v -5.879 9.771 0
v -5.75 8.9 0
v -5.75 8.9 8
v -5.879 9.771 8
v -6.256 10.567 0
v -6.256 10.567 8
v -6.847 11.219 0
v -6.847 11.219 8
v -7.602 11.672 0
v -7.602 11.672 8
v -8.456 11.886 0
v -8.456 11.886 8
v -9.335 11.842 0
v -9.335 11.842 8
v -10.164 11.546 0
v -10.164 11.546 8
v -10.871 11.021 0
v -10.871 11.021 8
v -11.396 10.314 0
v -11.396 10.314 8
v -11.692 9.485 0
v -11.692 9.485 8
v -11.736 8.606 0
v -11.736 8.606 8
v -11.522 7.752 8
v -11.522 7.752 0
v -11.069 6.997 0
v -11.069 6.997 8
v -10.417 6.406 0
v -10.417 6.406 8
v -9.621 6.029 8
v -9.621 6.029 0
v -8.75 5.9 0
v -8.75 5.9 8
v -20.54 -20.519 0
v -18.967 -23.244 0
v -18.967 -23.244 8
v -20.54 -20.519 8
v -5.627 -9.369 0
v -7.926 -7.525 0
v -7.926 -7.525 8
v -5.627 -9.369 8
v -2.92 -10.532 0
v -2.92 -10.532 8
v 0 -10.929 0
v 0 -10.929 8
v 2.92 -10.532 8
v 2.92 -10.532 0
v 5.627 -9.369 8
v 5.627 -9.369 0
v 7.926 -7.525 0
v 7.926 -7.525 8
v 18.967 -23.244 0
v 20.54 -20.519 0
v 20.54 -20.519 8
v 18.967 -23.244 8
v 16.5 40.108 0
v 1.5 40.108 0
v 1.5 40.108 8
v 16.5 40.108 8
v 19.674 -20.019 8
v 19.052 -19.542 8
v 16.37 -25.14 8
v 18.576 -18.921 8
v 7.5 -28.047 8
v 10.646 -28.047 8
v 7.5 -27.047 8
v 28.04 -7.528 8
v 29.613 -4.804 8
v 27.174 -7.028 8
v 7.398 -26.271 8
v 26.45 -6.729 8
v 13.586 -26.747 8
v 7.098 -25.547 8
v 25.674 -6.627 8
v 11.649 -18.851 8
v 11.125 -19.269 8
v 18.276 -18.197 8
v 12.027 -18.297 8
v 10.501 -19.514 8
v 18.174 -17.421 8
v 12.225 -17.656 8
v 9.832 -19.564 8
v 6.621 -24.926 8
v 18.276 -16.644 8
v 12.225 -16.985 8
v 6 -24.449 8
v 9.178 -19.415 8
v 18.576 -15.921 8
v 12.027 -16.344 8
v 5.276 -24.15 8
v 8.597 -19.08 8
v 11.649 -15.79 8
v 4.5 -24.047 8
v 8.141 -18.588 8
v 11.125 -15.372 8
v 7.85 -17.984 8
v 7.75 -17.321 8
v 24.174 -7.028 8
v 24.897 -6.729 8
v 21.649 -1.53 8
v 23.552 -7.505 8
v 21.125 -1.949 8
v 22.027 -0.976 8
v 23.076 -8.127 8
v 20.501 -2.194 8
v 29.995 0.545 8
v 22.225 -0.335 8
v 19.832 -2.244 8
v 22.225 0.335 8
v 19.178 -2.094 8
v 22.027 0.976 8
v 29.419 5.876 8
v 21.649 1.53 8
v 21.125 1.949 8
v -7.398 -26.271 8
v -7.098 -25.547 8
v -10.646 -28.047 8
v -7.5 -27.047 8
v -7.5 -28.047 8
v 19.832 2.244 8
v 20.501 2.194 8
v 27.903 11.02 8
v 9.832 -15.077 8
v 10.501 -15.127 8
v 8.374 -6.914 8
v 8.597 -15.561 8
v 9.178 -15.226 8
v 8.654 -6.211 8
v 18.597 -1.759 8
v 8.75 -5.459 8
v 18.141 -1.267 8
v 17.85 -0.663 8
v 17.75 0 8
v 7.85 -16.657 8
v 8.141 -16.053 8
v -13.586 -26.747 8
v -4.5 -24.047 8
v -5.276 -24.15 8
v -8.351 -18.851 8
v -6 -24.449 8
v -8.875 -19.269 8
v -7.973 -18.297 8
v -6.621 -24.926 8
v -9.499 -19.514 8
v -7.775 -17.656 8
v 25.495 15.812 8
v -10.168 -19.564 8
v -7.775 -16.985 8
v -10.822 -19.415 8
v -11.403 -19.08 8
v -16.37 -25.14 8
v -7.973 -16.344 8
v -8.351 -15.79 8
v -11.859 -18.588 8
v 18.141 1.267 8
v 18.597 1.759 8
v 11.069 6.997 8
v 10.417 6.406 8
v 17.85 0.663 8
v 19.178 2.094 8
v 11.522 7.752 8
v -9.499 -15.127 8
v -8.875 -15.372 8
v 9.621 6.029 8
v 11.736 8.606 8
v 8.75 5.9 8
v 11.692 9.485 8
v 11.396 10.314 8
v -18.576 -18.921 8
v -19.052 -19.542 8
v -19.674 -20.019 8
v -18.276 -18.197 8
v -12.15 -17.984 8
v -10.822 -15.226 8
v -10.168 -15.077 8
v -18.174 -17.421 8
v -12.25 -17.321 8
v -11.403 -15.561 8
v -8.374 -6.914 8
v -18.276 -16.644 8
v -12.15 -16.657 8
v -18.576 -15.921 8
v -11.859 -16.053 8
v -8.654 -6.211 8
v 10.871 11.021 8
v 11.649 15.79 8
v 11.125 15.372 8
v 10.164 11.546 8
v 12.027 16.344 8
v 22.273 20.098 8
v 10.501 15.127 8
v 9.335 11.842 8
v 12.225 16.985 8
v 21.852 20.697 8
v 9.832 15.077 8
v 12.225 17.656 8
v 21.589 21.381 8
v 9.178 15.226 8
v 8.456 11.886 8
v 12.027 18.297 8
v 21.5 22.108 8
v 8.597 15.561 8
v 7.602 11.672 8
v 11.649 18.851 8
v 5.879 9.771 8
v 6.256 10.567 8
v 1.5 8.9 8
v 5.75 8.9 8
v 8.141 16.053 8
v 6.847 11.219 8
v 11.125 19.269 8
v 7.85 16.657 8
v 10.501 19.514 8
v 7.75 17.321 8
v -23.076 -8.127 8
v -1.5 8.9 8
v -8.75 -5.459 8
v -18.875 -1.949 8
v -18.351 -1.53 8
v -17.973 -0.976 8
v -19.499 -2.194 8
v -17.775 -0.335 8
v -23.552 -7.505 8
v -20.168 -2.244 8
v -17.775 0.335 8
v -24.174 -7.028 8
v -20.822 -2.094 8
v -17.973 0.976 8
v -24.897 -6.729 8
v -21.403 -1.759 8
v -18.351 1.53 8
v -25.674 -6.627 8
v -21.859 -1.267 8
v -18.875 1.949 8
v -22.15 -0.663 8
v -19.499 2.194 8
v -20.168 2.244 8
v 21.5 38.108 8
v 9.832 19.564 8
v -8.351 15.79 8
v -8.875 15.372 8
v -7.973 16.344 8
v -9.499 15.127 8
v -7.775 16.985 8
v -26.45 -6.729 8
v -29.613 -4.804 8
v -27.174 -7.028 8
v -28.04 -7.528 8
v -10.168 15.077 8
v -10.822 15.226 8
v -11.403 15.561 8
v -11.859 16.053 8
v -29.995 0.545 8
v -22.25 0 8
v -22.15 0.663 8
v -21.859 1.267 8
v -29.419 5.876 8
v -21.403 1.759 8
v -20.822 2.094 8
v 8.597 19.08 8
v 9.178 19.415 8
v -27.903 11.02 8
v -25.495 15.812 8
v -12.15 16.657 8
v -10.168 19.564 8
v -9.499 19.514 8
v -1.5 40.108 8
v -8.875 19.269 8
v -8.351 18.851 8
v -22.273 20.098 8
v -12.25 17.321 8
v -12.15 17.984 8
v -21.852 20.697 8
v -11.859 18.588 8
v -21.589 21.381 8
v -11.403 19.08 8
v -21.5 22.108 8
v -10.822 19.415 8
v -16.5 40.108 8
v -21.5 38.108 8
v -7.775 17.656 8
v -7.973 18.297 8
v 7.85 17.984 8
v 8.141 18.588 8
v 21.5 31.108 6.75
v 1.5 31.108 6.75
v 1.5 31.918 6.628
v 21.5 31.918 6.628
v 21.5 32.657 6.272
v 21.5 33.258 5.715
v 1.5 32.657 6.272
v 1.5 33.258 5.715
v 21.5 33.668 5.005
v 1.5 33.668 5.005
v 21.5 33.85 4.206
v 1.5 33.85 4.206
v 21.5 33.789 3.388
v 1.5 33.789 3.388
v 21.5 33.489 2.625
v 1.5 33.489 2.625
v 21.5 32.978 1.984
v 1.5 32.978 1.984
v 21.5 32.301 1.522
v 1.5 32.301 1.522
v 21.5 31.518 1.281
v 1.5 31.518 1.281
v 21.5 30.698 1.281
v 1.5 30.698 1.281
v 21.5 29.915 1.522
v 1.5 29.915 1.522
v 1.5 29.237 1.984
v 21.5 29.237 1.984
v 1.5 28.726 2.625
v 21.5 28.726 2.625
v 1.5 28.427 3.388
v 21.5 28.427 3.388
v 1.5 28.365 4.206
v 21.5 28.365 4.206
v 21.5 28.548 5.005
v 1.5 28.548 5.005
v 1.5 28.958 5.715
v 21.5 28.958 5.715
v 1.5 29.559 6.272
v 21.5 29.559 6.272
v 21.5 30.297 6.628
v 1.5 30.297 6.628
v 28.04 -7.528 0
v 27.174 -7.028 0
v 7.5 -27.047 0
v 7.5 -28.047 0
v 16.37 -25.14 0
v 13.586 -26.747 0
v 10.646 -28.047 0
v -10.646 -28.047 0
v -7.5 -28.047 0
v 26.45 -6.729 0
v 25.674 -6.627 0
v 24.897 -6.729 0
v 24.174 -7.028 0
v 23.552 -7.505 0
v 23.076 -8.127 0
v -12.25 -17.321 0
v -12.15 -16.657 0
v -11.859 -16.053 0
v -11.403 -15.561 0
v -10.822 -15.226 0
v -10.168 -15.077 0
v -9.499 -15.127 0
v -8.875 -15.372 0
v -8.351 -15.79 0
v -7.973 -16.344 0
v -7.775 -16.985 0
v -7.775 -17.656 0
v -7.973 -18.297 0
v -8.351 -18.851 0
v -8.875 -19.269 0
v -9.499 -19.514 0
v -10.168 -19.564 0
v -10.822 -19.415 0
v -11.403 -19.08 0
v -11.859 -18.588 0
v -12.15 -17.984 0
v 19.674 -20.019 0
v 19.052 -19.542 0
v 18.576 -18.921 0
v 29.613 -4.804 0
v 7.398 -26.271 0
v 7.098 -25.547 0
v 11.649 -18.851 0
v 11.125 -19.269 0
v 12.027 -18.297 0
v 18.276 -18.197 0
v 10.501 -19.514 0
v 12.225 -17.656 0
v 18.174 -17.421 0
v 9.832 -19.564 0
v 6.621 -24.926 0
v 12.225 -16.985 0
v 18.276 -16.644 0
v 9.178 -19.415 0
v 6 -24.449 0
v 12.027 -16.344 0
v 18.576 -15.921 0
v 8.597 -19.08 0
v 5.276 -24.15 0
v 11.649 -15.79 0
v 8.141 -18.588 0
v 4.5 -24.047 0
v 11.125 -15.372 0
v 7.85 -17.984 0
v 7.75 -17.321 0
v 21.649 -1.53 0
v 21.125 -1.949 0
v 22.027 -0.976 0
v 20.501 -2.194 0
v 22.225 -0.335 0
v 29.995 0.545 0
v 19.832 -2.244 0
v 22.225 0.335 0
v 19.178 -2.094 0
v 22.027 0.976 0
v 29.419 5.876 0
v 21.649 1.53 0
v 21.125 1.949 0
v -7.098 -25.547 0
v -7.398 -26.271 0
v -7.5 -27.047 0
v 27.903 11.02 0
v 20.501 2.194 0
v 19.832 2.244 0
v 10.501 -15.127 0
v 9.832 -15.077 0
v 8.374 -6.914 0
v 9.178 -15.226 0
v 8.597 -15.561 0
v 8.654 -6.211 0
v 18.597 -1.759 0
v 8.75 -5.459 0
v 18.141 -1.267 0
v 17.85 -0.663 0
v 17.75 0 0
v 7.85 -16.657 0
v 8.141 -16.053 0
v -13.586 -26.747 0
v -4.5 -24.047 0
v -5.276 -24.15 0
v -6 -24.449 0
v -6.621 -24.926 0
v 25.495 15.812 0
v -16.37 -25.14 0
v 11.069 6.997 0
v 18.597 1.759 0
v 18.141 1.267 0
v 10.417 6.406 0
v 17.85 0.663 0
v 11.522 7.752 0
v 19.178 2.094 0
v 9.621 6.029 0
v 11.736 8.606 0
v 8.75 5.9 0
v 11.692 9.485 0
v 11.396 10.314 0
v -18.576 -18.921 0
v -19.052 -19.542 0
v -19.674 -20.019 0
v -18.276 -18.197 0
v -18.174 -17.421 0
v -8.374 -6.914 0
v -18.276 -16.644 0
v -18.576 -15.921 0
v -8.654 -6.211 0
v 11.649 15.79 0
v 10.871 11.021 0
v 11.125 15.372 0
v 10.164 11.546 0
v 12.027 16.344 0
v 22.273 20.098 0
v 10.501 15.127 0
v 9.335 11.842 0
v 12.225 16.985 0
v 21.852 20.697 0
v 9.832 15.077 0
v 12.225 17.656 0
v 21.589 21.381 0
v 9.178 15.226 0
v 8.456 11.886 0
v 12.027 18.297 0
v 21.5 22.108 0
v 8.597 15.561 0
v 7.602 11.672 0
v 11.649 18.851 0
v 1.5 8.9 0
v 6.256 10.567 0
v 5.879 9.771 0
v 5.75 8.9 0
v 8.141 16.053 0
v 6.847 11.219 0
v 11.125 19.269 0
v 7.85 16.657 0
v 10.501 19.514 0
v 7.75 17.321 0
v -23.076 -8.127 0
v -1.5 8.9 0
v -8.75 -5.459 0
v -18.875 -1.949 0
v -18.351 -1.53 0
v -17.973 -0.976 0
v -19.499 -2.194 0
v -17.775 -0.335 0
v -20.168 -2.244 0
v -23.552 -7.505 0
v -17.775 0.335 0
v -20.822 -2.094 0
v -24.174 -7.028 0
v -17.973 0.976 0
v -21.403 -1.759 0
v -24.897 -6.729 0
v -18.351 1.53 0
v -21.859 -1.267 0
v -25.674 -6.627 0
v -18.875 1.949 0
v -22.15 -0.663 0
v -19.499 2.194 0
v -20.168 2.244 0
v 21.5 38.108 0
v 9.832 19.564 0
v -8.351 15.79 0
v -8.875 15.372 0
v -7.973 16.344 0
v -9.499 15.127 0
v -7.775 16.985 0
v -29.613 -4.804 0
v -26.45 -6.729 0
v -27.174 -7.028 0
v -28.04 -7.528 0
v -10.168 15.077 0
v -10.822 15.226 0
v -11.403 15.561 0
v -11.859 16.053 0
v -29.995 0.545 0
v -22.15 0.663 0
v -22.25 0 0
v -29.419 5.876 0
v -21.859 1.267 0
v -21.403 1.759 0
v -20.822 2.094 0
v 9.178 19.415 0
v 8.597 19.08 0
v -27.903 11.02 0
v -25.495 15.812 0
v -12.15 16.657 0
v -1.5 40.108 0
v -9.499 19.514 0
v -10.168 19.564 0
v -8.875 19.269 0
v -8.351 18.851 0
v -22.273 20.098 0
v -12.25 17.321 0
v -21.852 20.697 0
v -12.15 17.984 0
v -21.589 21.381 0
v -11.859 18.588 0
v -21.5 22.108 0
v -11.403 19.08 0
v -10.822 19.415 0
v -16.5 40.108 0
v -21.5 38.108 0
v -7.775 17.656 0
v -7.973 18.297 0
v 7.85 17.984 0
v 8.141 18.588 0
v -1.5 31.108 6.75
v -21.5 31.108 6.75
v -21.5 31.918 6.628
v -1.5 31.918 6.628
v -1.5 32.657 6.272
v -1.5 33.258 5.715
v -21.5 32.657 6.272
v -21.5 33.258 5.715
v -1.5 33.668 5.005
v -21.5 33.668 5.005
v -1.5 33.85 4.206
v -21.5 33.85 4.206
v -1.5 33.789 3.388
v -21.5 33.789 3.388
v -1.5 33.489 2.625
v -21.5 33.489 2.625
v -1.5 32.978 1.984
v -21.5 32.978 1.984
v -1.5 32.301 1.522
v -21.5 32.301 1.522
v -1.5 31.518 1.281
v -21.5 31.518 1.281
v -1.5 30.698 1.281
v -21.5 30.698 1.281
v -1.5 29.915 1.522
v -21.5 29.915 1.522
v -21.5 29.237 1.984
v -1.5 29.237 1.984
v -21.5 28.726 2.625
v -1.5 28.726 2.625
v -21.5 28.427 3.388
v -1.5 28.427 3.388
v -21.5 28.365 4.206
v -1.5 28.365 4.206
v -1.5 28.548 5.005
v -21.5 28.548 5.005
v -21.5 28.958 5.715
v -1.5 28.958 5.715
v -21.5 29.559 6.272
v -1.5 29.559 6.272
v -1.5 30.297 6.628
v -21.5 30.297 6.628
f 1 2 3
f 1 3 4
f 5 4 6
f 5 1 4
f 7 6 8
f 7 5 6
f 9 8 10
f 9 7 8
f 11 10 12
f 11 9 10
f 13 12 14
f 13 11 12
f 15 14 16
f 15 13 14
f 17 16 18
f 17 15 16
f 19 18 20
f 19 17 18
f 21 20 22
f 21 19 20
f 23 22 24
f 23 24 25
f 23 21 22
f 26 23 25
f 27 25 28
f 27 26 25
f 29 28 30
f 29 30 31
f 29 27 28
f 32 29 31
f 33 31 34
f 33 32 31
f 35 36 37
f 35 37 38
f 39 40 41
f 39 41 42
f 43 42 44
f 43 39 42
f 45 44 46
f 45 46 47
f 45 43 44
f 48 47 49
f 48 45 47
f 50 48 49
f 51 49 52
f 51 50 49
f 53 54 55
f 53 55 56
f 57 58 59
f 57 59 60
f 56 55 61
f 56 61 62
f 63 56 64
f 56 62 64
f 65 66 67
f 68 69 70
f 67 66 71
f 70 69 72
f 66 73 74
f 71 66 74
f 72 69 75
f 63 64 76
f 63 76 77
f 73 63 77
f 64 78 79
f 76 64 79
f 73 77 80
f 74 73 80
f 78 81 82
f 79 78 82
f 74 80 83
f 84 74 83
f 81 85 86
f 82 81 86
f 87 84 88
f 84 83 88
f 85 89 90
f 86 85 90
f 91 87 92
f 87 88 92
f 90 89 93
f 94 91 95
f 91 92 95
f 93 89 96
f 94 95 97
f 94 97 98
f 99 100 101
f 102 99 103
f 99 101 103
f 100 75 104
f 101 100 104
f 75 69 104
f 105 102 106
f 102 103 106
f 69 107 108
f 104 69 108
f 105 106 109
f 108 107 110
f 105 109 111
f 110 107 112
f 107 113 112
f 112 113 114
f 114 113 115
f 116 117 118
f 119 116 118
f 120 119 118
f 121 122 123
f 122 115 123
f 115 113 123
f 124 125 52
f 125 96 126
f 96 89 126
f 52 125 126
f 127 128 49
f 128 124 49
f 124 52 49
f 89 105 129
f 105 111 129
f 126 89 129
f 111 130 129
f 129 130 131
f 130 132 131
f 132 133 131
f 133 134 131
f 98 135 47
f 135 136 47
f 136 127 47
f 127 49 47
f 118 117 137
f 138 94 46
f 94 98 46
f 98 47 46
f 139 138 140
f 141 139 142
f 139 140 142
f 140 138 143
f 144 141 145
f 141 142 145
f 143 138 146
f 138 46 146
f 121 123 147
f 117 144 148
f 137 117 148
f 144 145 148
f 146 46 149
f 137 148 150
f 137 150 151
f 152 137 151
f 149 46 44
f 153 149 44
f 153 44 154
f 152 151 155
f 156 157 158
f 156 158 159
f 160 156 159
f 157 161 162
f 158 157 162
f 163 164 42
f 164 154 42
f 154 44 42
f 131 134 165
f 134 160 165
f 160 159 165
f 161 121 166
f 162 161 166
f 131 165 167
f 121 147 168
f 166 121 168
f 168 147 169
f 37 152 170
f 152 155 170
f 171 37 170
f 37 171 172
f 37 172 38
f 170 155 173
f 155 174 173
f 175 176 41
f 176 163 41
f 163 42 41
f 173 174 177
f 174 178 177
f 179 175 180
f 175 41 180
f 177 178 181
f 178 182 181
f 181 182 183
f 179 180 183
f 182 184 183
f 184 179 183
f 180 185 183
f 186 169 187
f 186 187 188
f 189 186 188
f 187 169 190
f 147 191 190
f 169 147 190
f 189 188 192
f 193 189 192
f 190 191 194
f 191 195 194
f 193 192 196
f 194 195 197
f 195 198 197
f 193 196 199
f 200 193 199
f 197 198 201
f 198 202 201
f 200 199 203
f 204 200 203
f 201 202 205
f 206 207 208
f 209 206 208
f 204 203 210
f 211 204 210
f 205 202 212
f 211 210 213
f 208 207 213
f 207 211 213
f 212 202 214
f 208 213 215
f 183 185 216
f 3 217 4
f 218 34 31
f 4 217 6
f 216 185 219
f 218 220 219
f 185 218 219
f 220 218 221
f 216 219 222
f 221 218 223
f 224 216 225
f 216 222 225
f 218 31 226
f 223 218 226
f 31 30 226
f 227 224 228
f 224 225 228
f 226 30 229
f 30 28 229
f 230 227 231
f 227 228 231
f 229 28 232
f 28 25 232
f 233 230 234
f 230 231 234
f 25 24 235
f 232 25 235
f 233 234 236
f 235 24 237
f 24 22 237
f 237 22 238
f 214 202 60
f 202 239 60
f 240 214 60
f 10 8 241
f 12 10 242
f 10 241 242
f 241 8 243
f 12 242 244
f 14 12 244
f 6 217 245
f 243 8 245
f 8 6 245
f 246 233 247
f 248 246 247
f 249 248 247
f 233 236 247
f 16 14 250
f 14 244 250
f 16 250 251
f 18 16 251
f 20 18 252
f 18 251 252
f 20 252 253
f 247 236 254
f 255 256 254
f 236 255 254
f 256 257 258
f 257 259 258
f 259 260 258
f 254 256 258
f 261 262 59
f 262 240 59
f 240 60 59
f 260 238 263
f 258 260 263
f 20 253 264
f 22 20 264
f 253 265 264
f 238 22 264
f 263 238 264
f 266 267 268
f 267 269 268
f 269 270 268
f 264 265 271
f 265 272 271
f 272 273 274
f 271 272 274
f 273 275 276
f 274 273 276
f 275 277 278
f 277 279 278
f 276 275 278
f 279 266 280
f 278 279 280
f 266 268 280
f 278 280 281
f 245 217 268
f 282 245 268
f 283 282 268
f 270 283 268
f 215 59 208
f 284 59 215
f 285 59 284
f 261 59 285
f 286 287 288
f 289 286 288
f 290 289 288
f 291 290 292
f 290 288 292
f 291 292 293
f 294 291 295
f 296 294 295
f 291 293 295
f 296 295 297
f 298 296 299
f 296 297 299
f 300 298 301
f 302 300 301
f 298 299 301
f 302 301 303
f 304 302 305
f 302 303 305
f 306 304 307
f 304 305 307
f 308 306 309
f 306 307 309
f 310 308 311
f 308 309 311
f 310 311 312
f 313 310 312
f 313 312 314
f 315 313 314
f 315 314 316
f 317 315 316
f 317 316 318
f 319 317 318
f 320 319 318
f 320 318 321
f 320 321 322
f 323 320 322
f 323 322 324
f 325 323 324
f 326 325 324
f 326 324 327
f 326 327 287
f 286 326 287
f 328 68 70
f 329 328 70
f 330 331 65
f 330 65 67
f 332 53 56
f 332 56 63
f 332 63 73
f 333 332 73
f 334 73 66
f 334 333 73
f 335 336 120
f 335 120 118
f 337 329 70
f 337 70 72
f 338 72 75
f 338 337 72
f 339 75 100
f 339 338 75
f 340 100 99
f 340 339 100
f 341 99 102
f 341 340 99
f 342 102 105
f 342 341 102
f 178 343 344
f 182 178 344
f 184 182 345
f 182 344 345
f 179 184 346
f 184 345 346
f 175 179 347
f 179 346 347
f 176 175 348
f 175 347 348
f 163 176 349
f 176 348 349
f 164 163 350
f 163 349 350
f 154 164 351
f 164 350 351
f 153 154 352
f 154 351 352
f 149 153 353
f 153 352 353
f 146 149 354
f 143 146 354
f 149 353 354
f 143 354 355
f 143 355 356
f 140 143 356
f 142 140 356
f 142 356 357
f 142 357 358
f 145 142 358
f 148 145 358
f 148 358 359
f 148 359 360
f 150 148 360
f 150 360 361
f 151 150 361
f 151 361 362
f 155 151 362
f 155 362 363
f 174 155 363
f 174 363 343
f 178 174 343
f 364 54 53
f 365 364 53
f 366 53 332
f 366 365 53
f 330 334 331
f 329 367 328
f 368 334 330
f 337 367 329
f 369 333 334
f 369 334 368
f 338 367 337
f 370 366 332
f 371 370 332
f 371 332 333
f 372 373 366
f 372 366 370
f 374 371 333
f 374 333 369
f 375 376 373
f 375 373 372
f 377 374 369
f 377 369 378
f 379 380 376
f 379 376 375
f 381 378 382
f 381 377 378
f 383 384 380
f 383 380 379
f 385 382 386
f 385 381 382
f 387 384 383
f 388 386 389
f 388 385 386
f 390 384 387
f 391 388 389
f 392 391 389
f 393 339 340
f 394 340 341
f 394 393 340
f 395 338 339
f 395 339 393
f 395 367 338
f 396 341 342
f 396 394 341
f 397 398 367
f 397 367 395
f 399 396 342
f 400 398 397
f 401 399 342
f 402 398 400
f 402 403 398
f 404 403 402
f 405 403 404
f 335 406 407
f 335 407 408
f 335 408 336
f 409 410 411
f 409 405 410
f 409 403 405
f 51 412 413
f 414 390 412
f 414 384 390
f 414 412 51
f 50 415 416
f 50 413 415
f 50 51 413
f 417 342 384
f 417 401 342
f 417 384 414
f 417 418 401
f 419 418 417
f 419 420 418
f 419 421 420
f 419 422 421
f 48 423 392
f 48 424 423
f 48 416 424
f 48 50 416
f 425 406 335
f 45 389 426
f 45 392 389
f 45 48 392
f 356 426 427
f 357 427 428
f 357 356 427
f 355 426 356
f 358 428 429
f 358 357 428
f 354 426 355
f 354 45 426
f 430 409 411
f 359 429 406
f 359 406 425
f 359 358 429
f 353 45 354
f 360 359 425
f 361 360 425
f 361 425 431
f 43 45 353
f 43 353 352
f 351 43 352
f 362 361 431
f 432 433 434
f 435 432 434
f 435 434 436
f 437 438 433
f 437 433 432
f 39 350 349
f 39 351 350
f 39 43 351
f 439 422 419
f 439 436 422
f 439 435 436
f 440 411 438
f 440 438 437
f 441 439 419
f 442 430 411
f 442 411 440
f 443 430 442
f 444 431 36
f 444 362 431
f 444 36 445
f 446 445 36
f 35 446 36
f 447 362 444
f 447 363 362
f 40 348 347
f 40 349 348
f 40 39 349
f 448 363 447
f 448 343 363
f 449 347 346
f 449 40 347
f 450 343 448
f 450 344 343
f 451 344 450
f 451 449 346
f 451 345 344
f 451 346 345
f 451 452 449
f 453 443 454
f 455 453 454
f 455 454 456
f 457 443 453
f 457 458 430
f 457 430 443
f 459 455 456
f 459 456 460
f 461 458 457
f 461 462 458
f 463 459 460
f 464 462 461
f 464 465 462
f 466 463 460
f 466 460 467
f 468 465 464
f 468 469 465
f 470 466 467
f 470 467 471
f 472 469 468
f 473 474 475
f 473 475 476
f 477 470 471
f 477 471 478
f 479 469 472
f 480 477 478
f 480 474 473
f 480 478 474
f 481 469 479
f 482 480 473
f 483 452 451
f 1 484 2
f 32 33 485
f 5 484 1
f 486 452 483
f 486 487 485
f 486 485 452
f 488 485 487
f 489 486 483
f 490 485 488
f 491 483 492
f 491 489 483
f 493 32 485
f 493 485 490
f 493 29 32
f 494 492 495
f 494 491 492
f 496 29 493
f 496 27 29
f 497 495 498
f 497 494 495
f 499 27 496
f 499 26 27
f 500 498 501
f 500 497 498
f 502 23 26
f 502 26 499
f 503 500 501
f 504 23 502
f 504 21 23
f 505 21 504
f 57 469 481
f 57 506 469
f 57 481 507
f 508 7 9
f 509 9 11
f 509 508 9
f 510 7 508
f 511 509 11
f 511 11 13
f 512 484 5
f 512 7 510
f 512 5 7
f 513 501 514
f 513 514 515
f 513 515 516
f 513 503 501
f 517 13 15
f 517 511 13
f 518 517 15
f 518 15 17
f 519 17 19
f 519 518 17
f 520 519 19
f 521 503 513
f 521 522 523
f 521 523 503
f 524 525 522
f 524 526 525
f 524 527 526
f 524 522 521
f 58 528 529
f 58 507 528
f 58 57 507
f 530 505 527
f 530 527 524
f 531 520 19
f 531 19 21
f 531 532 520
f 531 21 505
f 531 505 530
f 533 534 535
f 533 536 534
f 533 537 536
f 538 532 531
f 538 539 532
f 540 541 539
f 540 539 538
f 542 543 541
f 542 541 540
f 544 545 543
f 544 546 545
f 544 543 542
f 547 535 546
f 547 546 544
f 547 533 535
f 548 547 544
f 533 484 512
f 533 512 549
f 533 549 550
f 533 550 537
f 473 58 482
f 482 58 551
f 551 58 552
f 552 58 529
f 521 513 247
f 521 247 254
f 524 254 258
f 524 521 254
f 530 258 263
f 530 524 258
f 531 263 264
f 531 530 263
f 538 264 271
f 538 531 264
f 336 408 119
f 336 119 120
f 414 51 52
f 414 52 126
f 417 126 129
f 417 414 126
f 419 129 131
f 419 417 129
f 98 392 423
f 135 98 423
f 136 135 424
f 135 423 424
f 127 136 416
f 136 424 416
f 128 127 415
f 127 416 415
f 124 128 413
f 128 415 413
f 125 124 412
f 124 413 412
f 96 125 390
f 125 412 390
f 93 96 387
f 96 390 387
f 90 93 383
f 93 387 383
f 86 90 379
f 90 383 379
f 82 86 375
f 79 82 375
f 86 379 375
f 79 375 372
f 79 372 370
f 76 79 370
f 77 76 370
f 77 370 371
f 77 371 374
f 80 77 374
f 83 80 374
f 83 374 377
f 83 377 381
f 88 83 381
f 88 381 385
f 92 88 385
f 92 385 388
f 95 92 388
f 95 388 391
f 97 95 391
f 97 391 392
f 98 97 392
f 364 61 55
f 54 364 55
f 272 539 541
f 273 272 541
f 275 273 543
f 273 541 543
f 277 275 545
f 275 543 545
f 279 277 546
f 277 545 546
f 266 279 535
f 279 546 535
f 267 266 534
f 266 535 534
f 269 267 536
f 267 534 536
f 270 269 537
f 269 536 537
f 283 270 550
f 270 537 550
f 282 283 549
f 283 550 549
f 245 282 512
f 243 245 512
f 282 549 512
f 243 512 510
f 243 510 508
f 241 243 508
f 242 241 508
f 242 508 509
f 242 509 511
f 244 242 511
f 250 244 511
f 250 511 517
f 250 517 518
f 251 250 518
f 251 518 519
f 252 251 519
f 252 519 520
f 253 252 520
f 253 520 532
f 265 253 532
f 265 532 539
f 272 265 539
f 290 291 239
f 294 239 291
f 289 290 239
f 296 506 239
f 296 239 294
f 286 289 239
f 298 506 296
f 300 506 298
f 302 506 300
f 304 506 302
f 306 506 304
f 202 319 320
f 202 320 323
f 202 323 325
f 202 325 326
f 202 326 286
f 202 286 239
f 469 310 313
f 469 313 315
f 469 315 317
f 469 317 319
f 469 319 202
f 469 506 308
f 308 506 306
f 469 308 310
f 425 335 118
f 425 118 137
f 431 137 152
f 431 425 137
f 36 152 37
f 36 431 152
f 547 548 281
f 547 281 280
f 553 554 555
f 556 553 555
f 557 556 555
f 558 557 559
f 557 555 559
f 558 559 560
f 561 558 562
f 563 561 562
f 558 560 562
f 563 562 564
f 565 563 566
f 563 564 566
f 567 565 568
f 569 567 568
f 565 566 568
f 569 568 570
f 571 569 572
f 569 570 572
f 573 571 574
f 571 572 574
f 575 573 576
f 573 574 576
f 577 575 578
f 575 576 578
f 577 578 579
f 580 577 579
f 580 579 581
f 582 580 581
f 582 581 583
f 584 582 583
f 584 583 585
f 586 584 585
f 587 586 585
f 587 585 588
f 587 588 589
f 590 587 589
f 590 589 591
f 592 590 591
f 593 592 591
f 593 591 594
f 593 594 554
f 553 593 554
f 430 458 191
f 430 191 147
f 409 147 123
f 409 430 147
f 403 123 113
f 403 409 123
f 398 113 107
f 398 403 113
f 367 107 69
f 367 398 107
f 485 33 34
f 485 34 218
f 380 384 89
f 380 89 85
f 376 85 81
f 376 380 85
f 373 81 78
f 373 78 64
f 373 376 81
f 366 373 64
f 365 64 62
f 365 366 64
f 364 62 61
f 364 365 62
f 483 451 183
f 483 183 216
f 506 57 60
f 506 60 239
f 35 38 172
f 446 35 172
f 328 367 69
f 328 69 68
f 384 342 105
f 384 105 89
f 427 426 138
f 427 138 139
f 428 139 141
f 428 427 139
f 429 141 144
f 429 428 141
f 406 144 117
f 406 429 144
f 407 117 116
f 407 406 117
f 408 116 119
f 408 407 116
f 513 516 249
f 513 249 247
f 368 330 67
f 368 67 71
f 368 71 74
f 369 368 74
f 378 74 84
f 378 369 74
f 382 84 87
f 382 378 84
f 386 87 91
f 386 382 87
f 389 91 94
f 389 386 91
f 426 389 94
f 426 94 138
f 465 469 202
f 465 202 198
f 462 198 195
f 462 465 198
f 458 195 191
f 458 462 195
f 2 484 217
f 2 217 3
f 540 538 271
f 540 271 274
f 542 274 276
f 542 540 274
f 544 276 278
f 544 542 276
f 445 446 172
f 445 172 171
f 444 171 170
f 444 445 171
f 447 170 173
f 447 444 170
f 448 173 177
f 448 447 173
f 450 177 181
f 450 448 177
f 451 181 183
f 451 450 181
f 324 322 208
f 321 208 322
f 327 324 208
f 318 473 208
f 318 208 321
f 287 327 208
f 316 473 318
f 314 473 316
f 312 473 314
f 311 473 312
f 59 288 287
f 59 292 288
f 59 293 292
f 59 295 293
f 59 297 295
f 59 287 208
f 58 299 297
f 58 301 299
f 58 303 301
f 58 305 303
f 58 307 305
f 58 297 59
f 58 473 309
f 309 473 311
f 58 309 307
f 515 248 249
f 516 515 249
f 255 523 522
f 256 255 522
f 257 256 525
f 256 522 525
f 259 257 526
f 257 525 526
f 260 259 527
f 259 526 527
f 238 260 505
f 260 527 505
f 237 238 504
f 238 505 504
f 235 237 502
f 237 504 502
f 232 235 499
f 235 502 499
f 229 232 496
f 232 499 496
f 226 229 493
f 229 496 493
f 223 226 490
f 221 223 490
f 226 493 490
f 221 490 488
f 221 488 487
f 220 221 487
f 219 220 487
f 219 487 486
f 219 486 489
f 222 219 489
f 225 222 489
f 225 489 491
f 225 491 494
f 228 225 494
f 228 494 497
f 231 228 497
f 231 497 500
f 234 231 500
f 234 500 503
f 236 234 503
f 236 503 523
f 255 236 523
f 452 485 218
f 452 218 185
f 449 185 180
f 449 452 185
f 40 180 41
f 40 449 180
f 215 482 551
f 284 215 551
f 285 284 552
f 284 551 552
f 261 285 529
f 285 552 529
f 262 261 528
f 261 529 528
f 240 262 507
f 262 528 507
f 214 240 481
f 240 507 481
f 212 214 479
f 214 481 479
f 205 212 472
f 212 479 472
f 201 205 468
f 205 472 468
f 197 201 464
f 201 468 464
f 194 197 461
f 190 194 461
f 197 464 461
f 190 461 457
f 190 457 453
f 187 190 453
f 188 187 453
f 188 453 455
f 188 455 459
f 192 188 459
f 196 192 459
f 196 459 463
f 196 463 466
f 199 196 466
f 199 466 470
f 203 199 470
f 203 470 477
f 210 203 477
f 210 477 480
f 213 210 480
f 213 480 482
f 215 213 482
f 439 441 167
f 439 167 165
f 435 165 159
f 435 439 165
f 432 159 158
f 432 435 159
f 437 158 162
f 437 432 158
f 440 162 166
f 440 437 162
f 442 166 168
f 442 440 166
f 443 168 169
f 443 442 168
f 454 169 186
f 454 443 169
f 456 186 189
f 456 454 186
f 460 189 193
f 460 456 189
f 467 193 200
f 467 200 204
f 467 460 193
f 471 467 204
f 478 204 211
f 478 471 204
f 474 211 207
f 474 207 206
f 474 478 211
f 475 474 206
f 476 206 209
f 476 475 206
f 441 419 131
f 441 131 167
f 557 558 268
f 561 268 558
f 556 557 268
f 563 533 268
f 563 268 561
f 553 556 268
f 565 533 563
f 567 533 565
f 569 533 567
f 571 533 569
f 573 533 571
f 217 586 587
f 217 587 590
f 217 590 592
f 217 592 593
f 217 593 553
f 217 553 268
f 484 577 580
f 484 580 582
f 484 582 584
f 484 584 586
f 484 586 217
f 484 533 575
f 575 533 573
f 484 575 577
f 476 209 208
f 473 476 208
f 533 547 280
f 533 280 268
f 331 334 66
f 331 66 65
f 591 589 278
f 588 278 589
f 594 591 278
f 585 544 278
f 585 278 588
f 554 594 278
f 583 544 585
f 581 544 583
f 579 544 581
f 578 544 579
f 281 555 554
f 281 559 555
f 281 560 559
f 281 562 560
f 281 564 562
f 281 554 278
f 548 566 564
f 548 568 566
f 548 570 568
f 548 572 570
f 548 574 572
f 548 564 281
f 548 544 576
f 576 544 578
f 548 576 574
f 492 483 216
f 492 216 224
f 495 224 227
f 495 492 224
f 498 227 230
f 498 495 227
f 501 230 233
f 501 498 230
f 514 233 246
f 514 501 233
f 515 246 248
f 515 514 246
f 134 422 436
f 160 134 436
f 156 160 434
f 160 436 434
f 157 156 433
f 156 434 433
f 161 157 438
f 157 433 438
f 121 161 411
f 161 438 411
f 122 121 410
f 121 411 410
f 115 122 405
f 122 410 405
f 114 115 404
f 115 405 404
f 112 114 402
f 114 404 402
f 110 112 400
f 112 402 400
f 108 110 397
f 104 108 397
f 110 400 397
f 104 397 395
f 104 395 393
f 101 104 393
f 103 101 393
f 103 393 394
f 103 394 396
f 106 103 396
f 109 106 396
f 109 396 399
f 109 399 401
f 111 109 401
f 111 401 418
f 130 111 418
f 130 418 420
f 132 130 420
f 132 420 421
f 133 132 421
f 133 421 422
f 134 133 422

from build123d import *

# Parameters (mm, degrees)
AUFSATZ_LINEAR_AUSTRAGEN1_DEPTH = 8
DURCHGANGSLOCH_F_R_M5_D         = 5.5
DURCHGANGSLOCH_F_R_M4_D         = 4.5


with BuildPart() as part:
    # Skizze1 → Aufsatz-Linear austragen1 (new body)
    with BuildSketch(Plane.XY):
        with BuildLine():
            Line((4.5, -24.047375097), (-4.5, -24.047375097))
            ThreePointArc((-4.5, -24.047375097), (-6.621320344, -24.926054753), (-7.5, -27.047375097))
            Line((-7.5, -27.047375097), (-7.5, -28.047375097))
            Line((-7.5, -28.047375097), (-10.646349149, -28.047375097))
            ThreePointArc((-10.646349149, -28.047375097), (-15, -25.980762114), (-18.966564769, -23.243696368))
            Line((-18.966564769, -23.243696368), (-20.539739343, -20.518878077))
            Line((-20.539739343, -20.518878077), (-19.673713939, -20.018878077))
            ThreePointArc((-19.673713939, -20.018878077), (-18.27593646, -18.197259001), (-18.575637728, -15.920801865))
            Line((-18.575637728, -15.920801865), (-23.075637728, -8.126573231))
            ThreePointArc((-23.075637728, -8.126573231), (-24.897256804, -6.728795752), (-27.173713939, -7.02849702))
            Line((-27.173713939, -7.02849702), (-28.039739343, -7.52849702))
            Line((-28.039739343, -7.52849702), (-29.612913917, -4.803678728))
            ThreePointArc((-29.612913917, -4.803678728), (-28.775894551, 8.482210373), (-22.272727273, 20.097900881))
            ThreePointArc((-22.272727273, 20.097900881), (-21.699837667, 21.031080126), (-21.5, 22.107690969))
            Line((-21.5, 22.107690969), (-21.5, 38.107690969))
            Line((-21.5, 38.107690969), (-16.5, 40.107690969))
            Line((-16.5, 40.107690969), (-1.5, 40.107690969))
            Line((-1.5, 40.107690969), (-1.5, 8.9))
            Line((-1.5, 8.9), (-5.75, 8.9))
            ThreePointArc((-5.75, 8.9), (-10.871320344, 11.021320344), (-8.75, 5.9))
            Line((-8.75, 5.9), (-8.75, -5.459334644))
            ThreePointArc((-8.75, -5.459334644), (-8.536286844, -6.571362352), (-7.925596252, -7.524953425))
            ThreePointArc((-7.925596252, -7.524953425), (0, -10.928860874), (7.925596252, -7.524953425))
            ThreePointArc((7.925596252, -7.524953425), (8.536286844, -6.571362352), (8.75, -5.459334644))
            Line((8.75, -5.459334644), (8.75, 5.9))
            ThreePointArc((8.75, 5.9), (10.871320344, 11.021320344), (5.75, 8.9))
            Line((5.75, 8.9), (1.5, 8.9))
            Line((1.5, 8.9), (1.5, 40.107690969))
            Line((1.5, 40.107690969), (16.5, 40.107690969))
            Line((16.5, 40.107690969), (21.5, 38.107690969))
            Line((21.5, 38.107690969), (21.5, 22.107690969))
            ThreePointArc((21.5, 22.107690969), (21.699837667, 21.031080126), (22.272727273, 20.097900881))
            ThreePointArc((22.272727273, 20.097900881), (28.775894551, 8.482210373), (29.612913917, -4.803678728))
            Line((29.612913917, -4.803678728), (28.039739343, -7.52849702))
            Line((28.039739343, -7.52849702), (27.173713939, -7.02849702))
            ThreePointArc((27.173713939, -7.02849702), (24.897256804, -6.728795752), (23.075637728, -8.126573231))
            Line((23.075637728, -8.126573231), (18.575637728, -15.920801865))
            ThreePointArc((18.575637728, -15.920801865), (18.27593646, -18.197259001), (19.673713939, -20.018878077))
            Line((19.673713939, -20.018878077), (20.539739343, -20.518878077))
            Line((20.539739343, -20.518878077), (18.966564769, -23.243696368))
            ThreePointArc((18.966564769, -23.243696368), (15, -25.980762114), (10.646349149, -28.047375097))
            Line((10.646349149, -28.047375097), (7.5, -28.047375097))
            Line((7.5, -28.047375097), (7.5, -27.047375097))
            ThreePointArc((7.5, -27.047375097), (6.621320344, -24.926054753), (4.5, -24.047375097))
        make_face()
    extrude(amount=AUFSATZ_LINEAR_AUSTRAGEN1_DEPTH)

    # Durchgangsloch für M5 (through all)
    with Locations(Plane(origin=(21.5, 0, 0), x_dir=(0, 0, -1), z_dir=(1, 0, 0))):
        with Locations((-4, 31.107690969)):
            Hole(DURCHGANGSLOCH_F_R_M5_D / 2)

    # Durchgangsloch für M4 (through all)
    with Locations(Plane.XY.offset(8)):
        with Locations((-20, 0), (-10, 17.320508076), (10, 17.320508076), (20, 0), (10, -17.320508076), (-10, -17.320508076)):
            Hole(DURCHGANGSLOCH_F_R_M4_D / 2)


solid = part.part
